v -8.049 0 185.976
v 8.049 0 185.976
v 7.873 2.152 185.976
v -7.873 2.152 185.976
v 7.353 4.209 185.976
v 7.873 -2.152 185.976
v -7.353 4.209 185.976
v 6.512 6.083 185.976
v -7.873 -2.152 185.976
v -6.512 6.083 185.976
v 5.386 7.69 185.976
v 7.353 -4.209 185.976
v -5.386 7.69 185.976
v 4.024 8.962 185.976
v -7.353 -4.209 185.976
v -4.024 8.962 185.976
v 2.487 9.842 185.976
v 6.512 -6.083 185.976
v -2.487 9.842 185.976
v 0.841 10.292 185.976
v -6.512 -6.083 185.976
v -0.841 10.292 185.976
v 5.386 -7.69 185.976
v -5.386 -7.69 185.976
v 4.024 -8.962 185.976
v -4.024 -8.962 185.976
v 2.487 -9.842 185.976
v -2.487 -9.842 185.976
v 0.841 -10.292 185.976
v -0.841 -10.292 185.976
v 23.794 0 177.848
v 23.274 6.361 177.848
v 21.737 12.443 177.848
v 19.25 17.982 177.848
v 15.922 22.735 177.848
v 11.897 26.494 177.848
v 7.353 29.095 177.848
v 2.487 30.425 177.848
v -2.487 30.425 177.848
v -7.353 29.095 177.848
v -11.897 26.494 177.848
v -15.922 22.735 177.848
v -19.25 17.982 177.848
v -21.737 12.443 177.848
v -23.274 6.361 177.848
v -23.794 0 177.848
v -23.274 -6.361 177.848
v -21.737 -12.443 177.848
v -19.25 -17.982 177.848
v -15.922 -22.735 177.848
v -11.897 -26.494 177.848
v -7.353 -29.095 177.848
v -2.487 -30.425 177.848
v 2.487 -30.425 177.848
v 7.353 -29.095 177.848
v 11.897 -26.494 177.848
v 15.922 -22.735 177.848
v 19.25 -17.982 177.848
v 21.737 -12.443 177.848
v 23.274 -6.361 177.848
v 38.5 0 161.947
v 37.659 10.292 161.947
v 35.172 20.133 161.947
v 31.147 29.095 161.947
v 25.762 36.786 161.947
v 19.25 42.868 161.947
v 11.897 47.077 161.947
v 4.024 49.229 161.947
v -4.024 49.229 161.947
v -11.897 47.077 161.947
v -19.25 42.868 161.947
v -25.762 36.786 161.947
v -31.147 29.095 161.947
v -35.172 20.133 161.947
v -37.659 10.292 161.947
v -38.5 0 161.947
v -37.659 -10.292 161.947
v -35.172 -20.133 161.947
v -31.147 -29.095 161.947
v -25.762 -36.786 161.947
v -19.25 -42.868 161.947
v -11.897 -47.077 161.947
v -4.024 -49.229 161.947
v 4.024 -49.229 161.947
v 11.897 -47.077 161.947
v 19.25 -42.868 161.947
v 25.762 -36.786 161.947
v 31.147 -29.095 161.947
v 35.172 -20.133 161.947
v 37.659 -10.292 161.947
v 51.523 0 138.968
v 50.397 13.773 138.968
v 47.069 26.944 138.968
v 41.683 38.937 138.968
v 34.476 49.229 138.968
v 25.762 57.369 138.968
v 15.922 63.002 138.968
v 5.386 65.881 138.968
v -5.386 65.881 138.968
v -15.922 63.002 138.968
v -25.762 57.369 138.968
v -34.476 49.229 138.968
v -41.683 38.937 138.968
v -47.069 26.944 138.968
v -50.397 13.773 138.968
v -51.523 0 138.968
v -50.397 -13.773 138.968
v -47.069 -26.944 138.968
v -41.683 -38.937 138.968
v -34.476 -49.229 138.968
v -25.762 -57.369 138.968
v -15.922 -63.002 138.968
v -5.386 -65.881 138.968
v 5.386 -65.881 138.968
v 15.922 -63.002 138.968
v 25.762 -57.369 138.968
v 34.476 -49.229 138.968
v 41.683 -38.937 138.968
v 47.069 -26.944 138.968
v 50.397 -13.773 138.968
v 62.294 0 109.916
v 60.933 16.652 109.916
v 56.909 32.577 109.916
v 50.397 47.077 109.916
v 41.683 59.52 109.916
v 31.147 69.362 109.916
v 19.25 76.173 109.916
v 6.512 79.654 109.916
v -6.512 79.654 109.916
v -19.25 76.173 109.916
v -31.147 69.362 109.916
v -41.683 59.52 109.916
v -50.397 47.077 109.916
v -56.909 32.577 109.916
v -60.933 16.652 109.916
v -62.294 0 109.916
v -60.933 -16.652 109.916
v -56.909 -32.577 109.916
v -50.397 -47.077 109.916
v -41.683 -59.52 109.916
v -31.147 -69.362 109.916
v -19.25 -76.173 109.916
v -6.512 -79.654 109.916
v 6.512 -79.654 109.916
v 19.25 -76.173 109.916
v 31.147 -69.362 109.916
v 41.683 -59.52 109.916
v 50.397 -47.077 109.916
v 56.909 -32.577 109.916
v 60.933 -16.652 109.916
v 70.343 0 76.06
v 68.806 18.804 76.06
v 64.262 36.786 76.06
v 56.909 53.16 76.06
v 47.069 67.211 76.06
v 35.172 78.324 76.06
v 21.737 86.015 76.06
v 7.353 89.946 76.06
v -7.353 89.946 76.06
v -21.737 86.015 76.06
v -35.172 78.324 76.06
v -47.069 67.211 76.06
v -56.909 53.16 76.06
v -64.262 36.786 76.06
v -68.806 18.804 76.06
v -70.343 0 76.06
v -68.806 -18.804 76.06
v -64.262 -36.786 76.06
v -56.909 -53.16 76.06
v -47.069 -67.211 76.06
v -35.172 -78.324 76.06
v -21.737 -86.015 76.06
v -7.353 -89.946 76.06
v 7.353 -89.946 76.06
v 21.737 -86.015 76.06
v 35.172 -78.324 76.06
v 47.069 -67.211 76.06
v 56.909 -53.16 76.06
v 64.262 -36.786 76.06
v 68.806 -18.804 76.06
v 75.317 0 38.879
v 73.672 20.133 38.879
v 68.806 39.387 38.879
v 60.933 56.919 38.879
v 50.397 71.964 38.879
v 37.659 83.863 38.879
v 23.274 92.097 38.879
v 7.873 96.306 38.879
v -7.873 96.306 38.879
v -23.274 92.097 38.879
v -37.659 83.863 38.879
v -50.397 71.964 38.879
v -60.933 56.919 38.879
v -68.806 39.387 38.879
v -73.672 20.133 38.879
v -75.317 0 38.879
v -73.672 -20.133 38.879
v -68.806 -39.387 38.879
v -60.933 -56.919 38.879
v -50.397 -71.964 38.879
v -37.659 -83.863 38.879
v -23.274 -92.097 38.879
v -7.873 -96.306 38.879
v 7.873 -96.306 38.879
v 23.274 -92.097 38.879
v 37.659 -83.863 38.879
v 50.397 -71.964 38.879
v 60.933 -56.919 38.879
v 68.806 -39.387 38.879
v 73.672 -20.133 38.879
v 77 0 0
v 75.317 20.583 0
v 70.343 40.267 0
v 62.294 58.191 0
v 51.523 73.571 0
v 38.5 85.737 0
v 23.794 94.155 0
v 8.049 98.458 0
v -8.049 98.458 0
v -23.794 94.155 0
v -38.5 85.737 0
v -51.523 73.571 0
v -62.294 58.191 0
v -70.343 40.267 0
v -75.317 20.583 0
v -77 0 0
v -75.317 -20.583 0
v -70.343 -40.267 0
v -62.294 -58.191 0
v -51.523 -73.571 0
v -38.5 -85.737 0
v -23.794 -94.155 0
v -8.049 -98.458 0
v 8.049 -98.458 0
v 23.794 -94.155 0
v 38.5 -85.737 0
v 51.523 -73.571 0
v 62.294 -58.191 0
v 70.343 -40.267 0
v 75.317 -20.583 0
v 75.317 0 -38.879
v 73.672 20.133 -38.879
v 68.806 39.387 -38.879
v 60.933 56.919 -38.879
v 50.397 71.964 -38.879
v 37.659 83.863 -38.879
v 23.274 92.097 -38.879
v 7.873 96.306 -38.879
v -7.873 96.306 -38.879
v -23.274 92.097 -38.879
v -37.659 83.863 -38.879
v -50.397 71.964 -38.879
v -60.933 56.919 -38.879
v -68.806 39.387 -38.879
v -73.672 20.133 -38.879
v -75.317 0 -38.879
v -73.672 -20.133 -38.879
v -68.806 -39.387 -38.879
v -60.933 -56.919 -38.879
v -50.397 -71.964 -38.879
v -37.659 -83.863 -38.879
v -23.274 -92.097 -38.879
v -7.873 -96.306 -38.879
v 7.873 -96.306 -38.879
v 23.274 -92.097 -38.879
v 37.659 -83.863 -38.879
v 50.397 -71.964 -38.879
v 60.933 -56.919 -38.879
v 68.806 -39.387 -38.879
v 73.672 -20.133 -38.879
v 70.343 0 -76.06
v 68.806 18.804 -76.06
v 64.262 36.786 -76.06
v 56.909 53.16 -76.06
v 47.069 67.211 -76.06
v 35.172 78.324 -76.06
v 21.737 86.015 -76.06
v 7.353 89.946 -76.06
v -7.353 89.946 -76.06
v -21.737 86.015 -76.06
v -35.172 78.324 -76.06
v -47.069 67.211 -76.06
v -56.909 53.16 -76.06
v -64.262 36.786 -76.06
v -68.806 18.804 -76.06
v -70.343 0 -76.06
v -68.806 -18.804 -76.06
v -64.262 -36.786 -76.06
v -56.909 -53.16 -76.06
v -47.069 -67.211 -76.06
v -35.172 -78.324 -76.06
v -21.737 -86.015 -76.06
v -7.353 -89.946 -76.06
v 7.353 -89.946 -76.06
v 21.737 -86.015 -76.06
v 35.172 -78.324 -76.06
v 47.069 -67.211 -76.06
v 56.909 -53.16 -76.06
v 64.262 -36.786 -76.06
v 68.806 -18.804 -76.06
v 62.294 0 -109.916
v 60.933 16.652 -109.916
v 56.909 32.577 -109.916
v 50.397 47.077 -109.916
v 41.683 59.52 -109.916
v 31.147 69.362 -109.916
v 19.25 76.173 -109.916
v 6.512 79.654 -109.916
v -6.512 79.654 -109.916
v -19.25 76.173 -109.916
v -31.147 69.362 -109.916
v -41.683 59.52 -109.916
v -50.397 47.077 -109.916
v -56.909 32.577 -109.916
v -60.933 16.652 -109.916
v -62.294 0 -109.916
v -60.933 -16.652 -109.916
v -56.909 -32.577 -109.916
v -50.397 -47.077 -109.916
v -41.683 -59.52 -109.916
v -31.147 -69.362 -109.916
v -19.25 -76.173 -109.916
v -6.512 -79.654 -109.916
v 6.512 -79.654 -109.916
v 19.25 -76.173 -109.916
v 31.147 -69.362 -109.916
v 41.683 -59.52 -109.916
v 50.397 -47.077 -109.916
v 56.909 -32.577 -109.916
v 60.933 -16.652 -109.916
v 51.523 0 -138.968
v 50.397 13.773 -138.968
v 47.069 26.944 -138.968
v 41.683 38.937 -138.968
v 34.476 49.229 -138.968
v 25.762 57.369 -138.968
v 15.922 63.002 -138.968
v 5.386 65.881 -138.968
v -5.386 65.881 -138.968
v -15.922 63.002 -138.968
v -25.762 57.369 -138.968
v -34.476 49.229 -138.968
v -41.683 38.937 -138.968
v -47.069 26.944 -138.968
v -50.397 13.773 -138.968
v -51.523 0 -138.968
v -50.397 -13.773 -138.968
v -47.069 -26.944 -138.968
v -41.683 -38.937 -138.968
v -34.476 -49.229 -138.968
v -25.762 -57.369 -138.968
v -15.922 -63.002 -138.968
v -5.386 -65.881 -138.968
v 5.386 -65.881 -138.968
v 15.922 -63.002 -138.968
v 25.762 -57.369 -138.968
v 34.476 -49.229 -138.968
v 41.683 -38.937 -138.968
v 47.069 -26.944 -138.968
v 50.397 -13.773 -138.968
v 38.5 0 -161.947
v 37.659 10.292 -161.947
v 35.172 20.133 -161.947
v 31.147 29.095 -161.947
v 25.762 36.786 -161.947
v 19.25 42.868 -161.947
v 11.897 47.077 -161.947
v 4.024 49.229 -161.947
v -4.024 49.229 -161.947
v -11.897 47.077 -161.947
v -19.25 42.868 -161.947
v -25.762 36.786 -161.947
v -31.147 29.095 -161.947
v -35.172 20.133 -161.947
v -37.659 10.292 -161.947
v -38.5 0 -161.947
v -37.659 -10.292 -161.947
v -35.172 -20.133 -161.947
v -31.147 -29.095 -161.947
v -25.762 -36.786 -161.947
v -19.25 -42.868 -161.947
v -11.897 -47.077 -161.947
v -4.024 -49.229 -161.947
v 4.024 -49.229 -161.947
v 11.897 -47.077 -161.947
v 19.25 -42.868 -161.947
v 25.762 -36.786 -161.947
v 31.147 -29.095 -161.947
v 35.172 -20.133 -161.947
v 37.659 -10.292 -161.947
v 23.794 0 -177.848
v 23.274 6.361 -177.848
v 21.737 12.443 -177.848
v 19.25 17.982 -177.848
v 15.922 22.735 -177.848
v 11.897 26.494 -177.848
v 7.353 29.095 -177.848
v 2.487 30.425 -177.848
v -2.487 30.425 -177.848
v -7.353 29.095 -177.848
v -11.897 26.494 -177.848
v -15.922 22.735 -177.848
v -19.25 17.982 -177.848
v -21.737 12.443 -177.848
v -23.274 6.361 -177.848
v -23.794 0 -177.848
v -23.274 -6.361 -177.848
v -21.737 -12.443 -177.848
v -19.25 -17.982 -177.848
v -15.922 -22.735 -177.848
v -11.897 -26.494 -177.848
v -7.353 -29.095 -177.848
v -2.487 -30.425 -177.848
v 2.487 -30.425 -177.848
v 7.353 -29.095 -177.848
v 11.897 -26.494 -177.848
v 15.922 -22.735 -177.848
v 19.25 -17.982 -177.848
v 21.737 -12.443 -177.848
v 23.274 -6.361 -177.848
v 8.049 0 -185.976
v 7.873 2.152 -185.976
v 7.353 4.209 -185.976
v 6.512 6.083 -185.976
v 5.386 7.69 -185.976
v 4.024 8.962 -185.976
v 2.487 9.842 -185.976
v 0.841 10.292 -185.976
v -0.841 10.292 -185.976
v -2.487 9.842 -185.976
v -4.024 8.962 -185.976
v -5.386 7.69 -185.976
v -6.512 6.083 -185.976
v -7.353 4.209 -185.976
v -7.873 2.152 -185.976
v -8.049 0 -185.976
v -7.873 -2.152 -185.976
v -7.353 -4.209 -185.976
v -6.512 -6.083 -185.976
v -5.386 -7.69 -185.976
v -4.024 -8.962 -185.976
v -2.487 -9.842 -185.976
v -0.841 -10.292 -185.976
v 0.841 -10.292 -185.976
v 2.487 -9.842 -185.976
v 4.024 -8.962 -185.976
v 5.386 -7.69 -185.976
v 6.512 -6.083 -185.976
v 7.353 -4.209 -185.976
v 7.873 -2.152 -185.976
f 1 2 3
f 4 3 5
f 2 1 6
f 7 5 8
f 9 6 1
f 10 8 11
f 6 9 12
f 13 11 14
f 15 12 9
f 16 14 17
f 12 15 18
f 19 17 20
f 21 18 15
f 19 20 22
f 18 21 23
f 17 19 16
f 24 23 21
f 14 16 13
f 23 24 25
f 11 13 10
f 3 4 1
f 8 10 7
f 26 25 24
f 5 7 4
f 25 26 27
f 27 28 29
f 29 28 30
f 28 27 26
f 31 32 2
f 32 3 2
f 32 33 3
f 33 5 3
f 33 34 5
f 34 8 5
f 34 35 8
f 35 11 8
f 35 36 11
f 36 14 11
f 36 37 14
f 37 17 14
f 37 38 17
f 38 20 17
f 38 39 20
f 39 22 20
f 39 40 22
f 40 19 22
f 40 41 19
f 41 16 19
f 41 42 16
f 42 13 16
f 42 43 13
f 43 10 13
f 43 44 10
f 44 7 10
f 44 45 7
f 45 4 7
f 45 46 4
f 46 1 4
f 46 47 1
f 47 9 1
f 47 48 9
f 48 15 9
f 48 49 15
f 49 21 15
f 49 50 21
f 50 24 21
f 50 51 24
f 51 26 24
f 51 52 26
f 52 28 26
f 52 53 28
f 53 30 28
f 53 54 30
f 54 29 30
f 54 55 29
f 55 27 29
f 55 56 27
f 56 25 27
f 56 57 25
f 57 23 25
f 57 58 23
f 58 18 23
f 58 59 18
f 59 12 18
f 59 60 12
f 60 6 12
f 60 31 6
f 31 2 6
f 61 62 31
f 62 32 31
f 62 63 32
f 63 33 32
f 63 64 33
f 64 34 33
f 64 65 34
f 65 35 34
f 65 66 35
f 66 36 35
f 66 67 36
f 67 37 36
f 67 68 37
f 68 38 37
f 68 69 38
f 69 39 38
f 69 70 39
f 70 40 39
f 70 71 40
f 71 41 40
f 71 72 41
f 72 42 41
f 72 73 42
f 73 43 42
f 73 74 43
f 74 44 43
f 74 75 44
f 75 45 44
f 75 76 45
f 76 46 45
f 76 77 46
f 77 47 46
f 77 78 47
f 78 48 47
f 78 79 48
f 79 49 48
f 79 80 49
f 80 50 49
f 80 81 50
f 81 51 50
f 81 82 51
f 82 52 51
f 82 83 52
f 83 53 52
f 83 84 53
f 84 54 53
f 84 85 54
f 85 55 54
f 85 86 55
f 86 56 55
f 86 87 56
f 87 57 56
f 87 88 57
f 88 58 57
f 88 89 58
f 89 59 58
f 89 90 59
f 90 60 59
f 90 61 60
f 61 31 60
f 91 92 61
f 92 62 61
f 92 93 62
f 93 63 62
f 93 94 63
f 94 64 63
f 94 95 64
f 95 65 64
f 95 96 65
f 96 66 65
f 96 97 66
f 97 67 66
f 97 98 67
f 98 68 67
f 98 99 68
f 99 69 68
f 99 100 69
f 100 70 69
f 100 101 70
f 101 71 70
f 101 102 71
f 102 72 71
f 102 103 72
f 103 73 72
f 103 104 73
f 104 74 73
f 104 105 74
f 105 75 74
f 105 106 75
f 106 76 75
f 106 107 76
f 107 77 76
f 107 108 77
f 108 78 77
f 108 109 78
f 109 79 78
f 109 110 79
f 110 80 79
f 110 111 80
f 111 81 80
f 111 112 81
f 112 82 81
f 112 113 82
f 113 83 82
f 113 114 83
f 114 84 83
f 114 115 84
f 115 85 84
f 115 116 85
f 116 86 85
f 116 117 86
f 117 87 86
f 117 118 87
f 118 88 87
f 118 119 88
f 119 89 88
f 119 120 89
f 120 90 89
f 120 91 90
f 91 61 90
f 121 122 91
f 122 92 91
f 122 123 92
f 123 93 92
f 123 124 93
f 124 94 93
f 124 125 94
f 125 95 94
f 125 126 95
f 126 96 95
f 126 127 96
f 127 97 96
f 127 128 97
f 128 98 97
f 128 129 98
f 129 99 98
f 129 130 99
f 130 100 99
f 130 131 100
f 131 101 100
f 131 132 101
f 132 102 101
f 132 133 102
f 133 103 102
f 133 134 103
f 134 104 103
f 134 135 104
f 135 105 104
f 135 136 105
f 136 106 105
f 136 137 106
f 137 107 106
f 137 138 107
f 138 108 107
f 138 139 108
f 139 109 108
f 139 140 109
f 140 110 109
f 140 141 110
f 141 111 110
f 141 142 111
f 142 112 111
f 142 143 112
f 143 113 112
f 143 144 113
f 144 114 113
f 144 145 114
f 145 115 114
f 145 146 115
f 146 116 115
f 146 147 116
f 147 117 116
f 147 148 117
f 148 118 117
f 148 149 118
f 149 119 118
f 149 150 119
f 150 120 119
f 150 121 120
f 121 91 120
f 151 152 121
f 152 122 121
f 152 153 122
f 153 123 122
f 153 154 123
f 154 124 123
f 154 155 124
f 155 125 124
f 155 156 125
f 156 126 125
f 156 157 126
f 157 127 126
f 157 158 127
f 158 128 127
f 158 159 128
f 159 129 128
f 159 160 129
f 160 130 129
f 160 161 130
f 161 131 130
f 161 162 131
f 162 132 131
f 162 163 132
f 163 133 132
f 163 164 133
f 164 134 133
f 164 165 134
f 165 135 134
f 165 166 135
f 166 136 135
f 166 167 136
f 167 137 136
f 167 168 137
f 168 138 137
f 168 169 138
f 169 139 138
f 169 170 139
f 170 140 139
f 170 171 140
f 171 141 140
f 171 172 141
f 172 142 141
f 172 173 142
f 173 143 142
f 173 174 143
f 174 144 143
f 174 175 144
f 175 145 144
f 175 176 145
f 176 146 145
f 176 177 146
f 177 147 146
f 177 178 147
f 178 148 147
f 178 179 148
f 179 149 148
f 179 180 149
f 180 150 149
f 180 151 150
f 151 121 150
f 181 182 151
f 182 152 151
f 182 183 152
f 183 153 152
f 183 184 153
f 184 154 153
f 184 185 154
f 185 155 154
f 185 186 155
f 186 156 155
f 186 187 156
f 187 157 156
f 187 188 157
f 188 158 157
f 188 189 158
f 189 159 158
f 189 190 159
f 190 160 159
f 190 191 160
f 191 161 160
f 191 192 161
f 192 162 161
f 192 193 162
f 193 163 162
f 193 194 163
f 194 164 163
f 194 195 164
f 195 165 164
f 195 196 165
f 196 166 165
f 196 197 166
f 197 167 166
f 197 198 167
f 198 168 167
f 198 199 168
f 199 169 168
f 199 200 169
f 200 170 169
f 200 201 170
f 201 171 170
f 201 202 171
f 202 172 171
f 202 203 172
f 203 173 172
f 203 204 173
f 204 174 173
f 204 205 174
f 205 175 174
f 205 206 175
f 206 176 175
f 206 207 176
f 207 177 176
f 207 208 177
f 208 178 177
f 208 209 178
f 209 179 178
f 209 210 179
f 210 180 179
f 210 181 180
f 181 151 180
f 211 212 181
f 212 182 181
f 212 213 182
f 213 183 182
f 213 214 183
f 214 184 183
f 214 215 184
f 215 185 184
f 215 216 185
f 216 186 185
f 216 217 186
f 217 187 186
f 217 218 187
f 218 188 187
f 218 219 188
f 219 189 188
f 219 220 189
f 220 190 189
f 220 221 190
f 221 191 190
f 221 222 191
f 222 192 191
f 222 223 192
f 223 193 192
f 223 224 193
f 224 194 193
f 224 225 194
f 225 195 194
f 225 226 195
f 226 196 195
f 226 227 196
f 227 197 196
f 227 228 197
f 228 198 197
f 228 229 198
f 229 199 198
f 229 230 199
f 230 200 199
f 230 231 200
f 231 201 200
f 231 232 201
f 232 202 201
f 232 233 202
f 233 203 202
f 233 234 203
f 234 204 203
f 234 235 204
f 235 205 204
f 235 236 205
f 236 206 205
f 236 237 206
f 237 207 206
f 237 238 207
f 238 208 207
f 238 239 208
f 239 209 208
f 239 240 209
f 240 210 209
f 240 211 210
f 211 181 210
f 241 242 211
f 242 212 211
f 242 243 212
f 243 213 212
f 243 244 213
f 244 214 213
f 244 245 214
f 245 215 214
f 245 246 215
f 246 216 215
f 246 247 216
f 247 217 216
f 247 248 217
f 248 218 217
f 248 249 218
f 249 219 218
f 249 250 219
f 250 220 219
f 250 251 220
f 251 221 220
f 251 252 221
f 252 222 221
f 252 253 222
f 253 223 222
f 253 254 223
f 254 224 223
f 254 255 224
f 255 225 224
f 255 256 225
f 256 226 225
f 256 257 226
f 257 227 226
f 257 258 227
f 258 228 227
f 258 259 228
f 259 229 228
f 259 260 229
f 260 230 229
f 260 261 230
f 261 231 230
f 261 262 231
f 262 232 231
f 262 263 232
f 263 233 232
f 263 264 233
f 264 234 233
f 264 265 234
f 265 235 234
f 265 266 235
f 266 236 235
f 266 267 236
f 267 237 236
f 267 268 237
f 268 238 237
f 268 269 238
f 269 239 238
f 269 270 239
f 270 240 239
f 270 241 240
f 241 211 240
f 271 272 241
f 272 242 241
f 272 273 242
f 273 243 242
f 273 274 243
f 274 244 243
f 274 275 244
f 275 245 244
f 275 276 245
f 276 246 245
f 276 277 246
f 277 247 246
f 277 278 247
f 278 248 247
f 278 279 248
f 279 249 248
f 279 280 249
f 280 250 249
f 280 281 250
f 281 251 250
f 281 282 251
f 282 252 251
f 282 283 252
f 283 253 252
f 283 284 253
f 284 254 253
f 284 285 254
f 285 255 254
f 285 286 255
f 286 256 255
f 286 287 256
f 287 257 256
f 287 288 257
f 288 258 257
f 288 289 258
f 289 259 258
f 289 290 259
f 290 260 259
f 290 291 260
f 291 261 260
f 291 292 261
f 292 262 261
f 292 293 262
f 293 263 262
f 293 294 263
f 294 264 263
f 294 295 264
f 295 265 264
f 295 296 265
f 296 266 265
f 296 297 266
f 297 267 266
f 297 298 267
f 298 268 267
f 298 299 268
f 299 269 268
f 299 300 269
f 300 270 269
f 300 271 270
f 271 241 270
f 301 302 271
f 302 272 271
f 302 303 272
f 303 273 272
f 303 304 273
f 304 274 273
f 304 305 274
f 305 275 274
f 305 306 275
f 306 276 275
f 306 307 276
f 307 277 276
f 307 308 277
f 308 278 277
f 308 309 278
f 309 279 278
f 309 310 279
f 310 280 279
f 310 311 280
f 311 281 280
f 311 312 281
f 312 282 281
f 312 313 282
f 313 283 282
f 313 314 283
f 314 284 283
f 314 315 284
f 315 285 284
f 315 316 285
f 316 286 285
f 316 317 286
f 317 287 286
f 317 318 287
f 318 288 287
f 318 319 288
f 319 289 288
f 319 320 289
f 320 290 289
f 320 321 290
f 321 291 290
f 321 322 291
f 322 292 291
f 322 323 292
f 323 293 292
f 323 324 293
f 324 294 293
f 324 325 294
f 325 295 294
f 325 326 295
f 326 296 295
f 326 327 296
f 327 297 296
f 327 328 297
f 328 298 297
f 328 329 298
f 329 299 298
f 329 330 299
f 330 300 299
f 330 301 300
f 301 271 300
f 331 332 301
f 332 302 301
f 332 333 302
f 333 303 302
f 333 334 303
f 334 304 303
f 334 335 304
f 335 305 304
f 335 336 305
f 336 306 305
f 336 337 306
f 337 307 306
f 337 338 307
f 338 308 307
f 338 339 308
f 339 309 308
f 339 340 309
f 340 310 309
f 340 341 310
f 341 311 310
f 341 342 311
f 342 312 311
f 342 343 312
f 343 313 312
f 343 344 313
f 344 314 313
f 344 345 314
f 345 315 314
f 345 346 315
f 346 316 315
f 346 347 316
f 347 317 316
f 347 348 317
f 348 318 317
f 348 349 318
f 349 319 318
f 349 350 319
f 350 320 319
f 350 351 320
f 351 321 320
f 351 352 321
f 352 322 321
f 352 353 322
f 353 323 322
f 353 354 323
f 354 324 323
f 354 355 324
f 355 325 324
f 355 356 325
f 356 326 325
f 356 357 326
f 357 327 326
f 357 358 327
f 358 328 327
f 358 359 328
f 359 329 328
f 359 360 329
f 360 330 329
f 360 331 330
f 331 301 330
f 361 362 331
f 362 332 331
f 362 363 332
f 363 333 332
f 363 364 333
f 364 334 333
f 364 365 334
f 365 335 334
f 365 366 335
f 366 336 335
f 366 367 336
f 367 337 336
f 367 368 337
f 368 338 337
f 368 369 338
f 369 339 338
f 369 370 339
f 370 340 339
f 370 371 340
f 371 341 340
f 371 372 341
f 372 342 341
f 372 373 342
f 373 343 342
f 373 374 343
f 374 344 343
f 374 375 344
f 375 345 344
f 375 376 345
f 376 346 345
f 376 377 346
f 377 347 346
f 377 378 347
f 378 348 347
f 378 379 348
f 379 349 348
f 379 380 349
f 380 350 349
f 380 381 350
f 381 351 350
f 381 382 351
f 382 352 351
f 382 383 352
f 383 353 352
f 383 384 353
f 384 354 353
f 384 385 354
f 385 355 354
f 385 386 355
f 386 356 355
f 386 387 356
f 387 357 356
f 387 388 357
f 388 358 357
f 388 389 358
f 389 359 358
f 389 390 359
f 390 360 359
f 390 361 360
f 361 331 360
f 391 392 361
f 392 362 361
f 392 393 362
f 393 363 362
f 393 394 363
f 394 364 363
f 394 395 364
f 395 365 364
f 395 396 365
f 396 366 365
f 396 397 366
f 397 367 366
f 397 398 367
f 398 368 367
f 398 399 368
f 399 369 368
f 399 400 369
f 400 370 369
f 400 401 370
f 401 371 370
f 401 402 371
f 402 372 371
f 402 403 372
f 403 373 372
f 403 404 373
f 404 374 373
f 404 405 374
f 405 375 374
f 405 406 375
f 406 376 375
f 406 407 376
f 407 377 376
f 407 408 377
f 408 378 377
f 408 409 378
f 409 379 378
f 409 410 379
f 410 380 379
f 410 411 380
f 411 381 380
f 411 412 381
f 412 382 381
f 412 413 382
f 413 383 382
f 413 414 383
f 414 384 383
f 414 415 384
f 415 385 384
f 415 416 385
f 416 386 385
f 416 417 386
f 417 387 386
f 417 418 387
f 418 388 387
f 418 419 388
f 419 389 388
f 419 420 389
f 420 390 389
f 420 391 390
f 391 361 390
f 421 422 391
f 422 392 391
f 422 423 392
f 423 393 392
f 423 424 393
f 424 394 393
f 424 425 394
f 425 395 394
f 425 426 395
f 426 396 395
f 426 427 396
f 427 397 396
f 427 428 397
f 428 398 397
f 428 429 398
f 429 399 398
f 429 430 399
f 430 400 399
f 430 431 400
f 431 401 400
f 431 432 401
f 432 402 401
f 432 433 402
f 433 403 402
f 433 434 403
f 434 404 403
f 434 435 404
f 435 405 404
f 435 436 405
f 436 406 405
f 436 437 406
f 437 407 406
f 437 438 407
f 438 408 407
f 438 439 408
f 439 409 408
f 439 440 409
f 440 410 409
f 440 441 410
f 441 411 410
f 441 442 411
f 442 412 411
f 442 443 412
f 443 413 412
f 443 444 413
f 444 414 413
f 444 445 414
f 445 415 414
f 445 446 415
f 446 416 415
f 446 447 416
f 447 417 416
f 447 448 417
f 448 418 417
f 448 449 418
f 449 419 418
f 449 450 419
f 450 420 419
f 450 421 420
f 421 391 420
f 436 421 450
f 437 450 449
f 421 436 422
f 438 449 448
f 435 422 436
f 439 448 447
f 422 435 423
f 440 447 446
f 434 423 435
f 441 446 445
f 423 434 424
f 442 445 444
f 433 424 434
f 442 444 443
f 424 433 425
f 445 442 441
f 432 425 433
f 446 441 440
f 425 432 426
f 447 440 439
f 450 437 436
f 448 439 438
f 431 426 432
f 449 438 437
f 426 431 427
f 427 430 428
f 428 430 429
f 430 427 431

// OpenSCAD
// Generated by SolidPython 1.0.1 on 2020-07-29 00:46:47


scale(v = [7, 9, 17]) {
	sphere(r = 11);
}
/***********************************************
*********      SolidPython code:      **********
************************************************
 
# import packages: SolidPython
from solid import *
from solid.utils import *
from itertools import chain, combinations, permutations


class Resize:

    def __init__(self, scad_file):
        self.scad_file = scad_file
        #self.scad_file = import_scad(scad_file)
        # cone/cylinder param:
        self.r1 = 0
        self.r2 = 0
        self.h = 0
        # rectangular prism param:
        self.w = 0
        self.l = 0
        # ellipse param:
        self.r = 0

    # import OpenScad code (file name corresponds to shape)


    # classify shape + parameters
    def assign(self, param1, param2, param3):
        if self.scad_file == 'cone.scad':
            self.r1 = param1
            self.r2 = param2
            self.h = param3
        elif self.scad_file == 'cylinder.scad':
            self.r1 = param1
            self.r2 = param2
            self.h = param3
        elif self.scad_file == 'rectangularPrism.scad':
            self.h = param1
            self.l = param2
            self.w = param3
        else:
            self.r = param1
            self.h = param2

    # resize parameters
    def iterate(self):
        x = range(3, 20, 2)
        i = 1
        if self.scad_file == 'cone.scad':
            tempList = list(permutations(x, 2))
            for temp in tempList:
                param1 = temp[0]
                param2 = temp[1]
                filepath = 'produced_scad_files/' + 'cone' + str(param1) + '_' + str(param2) + '_' + '.scad'
                scad_render_to_file(cylinder(h=param1, r1=param2, r2=0), filepath)

        elif self.scad_file == 'cylinder.scad':
            tempList = list(permutations(x, 3))
            for temp in tempList:
                param1 = temp[0]
                param2 = temp[1]
                filepath = 'produced_scad_files/' + 'cylinder' + str(param1) + '_' + str(param2) + '_' + '.scad'
                scad_render_to_file(cylinder(h=param1, r1=param2, r2=param2), filepath)

        elif self.scad_file == 'rectangularPrism.scad':
            tempList = list(permutations(x, 3))
            for temp in tempList:
                param1 = temp[0]
                param2 = temp[1]
                param3 = temp[2]
                filepath = 'produced_scad_files/' + 'rectangularPrism' + str(param1) + '_' + str(param2) + '_' + str(
                    param3) + '.scad'
                scad_render_to_file(cube(size=(param1, param2, param3)), filepath)

        elif self.scad_file == 'ellipse.scad':
            tempList = list(permutations(x, 4))
            for temp in tempList:
                param1 = temp[0]
                param2 = temp[1]
                param3 = temp[2]
                param4 = temp[3]
                filepath = 'produced_scad_files/' + 'ellipse' + str(param1) + '_' + str(param2) + '_' + str(param3) + '_' + str(param4) + '.scad'
                scad_render_to_file(scale([param1, param2, param3])(sphere(r=param4)), filepath)

    def render_to_scadfile(self):
        scad_render_to_file(scad, 'example.scad') 
 
************************************************/
